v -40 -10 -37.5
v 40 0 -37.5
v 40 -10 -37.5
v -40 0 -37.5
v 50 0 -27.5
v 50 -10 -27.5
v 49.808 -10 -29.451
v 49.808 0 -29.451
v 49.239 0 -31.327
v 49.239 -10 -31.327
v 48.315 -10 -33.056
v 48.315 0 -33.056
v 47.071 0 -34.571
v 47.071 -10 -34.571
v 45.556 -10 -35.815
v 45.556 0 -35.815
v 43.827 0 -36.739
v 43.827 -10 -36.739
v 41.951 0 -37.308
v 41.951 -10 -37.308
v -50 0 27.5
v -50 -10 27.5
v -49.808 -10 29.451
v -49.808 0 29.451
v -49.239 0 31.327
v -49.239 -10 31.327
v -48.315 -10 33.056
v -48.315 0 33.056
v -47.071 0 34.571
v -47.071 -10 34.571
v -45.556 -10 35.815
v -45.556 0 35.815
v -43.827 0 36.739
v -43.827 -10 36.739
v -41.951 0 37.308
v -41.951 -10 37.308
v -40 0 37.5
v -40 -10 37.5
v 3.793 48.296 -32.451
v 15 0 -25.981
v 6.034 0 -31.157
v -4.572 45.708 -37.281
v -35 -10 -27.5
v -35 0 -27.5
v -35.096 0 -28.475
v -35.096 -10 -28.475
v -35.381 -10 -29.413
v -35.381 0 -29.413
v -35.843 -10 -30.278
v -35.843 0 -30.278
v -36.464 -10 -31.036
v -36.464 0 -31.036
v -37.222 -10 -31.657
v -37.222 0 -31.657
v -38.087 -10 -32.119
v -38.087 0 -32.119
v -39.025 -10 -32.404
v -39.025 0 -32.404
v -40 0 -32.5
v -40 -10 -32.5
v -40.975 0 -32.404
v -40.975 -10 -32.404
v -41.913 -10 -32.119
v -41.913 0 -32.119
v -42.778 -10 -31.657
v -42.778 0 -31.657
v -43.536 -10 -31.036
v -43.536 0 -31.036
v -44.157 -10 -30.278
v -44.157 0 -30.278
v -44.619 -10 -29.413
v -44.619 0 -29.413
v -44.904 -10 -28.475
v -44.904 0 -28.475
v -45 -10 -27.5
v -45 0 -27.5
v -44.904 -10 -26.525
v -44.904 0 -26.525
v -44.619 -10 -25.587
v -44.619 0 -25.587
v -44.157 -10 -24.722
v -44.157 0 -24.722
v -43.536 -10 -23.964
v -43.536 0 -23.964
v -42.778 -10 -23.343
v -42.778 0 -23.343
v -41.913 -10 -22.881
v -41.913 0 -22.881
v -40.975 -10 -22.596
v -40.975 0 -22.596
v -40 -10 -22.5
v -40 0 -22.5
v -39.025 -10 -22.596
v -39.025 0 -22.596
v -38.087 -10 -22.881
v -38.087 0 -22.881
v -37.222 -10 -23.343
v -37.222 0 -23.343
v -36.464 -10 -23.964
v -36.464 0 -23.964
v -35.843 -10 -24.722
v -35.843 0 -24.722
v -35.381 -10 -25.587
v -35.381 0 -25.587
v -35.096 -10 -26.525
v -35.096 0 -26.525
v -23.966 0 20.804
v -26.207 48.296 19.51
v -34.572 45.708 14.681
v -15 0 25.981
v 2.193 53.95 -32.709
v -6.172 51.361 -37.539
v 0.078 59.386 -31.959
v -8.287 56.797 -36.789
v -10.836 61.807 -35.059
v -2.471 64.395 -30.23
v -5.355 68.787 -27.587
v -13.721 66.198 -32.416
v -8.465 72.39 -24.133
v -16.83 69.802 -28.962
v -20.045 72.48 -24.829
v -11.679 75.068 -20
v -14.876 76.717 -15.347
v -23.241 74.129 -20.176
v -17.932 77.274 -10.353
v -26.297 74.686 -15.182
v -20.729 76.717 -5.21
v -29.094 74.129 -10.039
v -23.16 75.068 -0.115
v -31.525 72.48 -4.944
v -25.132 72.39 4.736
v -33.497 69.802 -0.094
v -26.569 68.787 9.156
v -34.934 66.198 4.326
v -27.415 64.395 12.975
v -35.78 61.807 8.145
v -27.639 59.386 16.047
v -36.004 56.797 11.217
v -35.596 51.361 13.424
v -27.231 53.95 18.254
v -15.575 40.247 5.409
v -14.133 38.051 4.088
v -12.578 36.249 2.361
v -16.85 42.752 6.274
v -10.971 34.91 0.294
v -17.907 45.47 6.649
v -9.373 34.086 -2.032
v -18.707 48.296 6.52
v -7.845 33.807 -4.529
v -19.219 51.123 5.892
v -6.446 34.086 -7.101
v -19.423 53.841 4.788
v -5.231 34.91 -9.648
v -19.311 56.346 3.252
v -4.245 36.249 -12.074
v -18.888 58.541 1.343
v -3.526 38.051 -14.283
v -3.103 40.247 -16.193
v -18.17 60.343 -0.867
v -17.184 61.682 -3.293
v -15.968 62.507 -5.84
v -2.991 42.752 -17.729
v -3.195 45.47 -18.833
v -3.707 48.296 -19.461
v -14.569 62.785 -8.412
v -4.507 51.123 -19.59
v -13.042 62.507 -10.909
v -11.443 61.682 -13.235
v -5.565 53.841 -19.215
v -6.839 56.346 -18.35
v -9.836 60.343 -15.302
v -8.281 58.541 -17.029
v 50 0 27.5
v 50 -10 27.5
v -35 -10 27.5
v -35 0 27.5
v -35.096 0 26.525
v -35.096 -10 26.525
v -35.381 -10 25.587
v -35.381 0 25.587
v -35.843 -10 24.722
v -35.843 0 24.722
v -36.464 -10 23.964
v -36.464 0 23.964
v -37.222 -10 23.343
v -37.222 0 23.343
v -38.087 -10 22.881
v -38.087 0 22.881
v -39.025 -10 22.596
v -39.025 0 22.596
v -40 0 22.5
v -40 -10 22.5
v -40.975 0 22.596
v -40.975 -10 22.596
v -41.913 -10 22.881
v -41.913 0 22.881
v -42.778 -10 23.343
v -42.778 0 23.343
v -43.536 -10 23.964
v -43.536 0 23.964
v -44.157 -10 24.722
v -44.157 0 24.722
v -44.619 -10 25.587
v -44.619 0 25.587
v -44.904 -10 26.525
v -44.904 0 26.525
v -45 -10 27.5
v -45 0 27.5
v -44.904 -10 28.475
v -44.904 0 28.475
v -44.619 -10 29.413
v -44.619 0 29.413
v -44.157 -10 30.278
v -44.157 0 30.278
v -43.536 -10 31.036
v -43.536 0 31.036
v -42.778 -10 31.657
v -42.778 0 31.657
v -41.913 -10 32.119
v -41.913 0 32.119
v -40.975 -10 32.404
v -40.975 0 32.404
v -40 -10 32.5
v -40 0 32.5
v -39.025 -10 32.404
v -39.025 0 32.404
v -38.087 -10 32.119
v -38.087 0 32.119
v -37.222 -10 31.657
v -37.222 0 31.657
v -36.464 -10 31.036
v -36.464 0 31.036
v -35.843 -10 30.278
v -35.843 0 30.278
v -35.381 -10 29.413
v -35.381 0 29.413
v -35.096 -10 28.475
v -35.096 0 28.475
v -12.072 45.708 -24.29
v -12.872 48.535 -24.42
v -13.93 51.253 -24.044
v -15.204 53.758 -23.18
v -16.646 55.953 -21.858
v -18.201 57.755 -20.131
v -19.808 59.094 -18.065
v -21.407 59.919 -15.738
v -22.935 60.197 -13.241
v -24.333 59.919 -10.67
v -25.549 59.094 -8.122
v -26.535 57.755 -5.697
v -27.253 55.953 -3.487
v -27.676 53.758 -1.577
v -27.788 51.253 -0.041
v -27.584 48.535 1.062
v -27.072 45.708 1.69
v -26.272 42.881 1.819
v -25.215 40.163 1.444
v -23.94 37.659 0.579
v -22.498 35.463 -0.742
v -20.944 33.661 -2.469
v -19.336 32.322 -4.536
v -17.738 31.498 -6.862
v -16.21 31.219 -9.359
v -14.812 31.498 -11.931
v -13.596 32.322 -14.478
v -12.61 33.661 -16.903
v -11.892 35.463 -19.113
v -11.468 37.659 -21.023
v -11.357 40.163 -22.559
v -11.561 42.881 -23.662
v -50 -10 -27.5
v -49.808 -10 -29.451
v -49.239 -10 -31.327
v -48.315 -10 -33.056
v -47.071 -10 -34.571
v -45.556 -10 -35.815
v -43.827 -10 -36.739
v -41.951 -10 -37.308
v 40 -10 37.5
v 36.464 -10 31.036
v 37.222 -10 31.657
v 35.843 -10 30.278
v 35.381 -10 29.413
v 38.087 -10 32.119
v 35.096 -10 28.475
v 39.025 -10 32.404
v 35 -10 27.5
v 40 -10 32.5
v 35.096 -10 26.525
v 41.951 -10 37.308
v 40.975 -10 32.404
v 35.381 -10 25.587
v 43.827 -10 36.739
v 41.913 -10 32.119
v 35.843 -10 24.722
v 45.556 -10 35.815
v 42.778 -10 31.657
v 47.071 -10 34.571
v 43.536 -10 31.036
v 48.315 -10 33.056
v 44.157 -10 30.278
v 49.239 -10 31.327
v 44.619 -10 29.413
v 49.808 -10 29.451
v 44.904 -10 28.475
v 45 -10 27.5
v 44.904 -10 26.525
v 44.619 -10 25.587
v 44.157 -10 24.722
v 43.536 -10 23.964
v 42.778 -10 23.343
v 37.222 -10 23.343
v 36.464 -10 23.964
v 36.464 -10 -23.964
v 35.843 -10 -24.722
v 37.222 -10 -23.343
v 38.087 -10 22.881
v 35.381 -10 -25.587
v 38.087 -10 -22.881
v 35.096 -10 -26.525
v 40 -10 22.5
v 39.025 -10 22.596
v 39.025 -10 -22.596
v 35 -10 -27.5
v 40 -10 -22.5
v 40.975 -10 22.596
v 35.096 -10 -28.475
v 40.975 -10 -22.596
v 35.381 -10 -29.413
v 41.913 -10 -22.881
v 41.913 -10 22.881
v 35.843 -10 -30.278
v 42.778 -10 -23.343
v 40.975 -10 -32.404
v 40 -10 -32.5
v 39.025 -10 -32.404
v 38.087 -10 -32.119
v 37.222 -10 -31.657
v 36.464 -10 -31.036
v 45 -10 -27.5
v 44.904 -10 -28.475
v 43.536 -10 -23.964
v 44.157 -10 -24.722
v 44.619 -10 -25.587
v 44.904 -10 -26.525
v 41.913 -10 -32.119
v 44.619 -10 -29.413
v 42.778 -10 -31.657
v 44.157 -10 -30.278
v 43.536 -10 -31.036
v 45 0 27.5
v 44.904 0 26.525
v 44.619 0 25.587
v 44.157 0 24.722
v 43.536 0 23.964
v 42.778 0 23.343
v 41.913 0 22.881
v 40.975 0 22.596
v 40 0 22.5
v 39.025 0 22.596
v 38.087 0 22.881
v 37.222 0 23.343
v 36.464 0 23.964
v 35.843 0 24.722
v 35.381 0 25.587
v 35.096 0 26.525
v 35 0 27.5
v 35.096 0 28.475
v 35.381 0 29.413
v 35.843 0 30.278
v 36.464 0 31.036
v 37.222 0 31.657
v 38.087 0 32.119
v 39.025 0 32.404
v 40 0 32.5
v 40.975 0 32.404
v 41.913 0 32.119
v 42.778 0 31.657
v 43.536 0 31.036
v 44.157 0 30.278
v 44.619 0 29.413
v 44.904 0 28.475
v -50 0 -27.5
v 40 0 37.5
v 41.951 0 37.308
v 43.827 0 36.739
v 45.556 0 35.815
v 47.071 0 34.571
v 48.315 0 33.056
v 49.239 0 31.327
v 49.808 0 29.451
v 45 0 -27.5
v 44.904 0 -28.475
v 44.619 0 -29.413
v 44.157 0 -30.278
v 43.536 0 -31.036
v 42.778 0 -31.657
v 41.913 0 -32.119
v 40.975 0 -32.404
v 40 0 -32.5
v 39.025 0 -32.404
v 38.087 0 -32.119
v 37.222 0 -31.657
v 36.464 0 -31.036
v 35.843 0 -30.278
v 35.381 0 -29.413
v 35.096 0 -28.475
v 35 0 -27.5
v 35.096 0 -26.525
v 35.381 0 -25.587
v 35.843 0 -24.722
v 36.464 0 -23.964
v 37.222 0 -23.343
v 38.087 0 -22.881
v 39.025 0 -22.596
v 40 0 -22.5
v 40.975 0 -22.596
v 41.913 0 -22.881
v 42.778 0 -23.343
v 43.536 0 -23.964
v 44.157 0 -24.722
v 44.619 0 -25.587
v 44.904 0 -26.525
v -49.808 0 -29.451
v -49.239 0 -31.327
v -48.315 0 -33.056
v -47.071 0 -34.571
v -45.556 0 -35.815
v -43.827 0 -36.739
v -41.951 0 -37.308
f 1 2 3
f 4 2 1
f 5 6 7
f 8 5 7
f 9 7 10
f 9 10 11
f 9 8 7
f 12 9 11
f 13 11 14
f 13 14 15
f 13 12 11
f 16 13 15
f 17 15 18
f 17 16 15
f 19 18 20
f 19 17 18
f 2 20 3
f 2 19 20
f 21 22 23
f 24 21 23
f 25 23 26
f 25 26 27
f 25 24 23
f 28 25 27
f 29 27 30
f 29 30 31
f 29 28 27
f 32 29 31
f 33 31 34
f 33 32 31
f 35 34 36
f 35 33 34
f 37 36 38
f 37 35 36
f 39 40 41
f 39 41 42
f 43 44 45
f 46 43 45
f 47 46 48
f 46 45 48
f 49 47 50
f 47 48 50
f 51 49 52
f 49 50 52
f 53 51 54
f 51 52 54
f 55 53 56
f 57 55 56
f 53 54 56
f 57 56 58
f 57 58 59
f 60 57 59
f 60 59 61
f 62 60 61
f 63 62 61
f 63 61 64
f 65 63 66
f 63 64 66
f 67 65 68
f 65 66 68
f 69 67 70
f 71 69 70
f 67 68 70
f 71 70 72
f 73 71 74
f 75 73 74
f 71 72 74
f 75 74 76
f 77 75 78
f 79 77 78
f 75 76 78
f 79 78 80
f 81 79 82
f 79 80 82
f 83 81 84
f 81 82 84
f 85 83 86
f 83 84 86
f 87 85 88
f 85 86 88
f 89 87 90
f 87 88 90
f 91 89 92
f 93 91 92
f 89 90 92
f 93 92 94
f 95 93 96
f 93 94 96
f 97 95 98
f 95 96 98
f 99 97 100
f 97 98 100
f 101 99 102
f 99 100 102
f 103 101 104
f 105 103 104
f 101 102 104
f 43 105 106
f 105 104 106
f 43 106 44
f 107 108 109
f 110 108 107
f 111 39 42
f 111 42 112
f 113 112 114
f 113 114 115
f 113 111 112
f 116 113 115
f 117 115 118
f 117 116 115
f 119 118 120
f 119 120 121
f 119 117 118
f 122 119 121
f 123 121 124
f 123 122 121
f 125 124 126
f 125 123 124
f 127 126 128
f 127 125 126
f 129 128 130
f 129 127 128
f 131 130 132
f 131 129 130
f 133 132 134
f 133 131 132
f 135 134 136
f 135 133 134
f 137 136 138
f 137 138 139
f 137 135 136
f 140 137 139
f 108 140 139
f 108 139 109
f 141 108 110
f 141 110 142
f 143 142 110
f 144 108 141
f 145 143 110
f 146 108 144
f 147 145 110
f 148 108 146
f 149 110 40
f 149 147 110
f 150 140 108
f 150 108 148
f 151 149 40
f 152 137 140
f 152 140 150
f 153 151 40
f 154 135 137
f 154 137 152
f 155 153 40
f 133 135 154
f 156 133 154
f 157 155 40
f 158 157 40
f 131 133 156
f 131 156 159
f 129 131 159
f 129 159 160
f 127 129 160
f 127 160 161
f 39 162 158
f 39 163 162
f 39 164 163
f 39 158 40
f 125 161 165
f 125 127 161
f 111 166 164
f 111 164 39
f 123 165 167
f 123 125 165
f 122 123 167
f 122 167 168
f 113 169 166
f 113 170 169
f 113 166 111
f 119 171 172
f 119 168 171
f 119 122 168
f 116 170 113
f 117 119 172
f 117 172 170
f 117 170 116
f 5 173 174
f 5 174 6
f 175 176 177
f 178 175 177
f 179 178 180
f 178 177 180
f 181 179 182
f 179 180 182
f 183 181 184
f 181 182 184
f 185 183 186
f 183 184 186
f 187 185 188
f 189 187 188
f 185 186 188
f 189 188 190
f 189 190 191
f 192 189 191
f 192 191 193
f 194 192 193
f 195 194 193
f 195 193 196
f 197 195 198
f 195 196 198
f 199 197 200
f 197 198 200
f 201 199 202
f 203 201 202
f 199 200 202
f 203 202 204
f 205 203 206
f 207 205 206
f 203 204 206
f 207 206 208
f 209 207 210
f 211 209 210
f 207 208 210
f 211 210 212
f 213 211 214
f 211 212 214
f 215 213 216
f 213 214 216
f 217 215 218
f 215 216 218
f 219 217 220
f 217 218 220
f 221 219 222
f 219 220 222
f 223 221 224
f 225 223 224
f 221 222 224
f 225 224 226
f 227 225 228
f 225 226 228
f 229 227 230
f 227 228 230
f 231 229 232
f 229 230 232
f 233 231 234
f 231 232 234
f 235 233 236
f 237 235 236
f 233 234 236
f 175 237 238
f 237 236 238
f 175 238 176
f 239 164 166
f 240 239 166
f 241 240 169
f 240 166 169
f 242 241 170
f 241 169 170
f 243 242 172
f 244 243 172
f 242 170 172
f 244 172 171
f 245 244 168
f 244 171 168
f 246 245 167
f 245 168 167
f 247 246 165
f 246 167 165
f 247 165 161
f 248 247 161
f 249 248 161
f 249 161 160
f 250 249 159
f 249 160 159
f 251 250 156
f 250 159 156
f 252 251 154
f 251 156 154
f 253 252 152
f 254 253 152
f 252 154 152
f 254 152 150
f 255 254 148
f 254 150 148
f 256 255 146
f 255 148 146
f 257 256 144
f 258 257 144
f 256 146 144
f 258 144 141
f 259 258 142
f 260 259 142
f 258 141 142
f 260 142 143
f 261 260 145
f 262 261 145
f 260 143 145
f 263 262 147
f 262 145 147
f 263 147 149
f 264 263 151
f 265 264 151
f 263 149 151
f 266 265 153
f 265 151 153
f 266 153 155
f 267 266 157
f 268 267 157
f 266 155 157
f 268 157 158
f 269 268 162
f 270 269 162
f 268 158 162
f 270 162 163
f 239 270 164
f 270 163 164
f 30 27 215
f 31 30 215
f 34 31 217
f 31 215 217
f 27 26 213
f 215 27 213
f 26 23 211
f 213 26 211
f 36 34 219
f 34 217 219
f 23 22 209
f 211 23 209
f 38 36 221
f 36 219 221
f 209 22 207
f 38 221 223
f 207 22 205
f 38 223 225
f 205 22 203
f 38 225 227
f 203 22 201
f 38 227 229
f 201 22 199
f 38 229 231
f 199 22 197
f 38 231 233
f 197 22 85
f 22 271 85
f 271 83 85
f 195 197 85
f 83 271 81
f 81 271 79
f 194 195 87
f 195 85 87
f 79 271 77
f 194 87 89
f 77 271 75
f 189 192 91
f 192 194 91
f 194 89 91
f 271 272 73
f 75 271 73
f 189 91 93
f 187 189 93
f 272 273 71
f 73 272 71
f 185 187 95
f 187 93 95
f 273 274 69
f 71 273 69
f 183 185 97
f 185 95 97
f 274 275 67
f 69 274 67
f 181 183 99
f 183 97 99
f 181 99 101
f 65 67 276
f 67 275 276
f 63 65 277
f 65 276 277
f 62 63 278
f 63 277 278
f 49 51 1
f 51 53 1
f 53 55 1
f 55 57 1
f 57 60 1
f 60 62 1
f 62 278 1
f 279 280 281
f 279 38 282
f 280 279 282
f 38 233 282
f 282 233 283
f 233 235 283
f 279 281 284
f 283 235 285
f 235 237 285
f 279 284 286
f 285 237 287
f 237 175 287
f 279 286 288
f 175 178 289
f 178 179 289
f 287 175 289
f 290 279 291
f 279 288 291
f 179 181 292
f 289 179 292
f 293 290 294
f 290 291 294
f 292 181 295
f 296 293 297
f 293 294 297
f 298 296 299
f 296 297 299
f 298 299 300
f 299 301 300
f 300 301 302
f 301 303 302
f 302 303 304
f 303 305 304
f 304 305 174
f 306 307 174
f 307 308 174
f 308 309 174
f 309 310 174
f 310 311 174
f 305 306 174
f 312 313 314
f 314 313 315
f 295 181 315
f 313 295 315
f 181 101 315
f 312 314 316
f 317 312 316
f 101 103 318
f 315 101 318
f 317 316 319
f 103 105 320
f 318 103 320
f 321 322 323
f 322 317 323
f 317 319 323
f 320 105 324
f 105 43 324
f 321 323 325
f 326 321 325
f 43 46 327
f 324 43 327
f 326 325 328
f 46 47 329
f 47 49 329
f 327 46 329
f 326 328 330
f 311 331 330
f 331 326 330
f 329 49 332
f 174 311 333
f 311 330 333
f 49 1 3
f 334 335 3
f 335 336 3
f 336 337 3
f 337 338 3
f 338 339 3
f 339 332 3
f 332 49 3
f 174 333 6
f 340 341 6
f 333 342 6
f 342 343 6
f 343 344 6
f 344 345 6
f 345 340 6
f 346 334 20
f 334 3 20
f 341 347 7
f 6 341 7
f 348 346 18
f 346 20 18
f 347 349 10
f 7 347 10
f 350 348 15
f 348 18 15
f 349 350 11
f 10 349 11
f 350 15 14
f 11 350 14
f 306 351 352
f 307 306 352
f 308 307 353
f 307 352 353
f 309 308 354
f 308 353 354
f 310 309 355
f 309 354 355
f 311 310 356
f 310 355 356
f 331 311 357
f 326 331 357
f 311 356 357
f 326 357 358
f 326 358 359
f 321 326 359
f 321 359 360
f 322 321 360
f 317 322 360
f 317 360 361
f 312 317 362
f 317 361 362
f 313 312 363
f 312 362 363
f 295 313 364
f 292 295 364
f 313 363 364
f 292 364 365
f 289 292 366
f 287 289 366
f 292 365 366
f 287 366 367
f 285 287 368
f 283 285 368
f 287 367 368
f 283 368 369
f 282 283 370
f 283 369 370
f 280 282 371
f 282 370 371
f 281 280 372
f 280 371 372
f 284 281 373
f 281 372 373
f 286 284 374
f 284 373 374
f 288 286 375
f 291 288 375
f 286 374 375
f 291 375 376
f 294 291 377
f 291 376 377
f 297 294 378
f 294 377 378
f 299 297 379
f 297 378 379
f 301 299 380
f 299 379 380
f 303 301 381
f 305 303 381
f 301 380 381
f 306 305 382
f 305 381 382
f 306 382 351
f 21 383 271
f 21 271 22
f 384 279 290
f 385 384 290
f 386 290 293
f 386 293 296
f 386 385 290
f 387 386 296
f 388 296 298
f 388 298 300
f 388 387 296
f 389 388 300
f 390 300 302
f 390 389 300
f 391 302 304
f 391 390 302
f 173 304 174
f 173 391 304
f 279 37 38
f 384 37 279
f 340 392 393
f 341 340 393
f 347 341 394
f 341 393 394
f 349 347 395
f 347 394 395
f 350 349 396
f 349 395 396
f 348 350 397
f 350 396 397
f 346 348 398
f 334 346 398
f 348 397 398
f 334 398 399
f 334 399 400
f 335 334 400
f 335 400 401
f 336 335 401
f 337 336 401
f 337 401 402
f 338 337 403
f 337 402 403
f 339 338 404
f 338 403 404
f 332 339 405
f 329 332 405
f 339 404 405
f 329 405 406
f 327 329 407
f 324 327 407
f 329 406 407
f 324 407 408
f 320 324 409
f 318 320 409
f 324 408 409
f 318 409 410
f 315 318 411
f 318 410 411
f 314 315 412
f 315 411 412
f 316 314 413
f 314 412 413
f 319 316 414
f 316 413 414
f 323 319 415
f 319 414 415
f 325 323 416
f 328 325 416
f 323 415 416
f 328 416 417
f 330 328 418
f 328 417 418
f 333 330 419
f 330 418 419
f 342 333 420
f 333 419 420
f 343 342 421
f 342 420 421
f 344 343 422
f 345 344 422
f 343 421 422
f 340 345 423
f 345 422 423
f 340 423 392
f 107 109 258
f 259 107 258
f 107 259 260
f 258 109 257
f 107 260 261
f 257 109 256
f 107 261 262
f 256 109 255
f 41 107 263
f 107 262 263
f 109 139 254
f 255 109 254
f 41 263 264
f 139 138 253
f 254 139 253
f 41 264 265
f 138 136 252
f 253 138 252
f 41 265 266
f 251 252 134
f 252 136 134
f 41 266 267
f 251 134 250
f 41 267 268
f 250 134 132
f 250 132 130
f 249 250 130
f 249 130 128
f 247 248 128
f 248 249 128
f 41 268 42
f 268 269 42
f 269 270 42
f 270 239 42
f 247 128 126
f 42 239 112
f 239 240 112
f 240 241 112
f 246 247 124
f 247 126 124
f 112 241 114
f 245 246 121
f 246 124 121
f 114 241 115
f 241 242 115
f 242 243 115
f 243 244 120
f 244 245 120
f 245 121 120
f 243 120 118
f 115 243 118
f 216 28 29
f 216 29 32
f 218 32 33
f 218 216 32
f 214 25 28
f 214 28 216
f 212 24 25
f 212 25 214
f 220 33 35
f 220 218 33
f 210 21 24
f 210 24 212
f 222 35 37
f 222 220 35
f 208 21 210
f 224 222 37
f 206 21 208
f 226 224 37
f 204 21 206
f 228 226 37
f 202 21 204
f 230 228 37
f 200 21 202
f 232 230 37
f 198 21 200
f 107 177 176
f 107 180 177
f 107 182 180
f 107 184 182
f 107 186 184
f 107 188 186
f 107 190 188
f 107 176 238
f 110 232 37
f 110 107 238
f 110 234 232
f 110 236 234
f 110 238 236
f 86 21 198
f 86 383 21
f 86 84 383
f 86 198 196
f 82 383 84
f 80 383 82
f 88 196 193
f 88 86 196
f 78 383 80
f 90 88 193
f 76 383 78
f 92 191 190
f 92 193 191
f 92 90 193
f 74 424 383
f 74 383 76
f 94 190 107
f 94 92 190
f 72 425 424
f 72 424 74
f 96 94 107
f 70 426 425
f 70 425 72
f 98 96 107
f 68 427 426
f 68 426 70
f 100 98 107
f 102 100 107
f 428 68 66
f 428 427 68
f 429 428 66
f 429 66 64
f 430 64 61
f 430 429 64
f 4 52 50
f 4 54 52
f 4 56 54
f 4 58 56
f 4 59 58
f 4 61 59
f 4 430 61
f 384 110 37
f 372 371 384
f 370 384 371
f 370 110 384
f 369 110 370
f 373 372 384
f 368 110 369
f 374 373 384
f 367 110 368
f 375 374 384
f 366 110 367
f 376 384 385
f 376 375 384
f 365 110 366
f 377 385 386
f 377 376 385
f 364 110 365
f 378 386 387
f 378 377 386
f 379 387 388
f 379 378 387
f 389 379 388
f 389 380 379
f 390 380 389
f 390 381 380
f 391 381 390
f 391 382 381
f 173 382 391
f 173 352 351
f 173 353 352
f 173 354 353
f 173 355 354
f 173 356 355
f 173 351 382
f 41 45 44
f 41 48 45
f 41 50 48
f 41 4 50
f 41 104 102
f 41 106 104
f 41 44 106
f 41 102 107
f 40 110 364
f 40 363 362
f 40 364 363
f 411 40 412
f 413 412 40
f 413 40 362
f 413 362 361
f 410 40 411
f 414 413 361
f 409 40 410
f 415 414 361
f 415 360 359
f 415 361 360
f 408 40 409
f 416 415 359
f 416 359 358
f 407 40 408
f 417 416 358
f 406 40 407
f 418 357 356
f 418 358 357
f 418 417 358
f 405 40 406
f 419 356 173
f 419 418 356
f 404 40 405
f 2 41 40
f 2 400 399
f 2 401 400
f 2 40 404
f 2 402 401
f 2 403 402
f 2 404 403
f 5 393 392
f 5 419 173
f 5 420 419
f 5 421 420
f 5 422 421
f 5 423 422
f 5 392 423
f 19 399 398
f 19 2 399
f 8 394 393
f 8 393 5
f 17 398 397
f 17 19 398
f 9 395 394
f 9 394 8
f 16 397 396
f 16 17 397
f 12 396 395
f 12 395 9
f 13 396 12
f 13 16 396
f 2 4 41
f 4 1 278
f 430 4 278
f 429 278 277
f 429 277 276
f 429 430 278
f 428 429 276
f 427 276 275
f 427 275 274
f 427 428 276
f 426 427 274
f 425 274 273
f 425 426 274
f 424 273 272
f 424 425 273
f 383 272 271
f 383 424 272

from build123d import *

# Parameters (mm, degrees)
SKETCH_1_R      = 5
EXTRUDE_1_DEPTH = 10
SKETCH_3_R      = 15
EXTRUDE_2_DEPTH = 10


with BuildPart() as part:
    # 草圖1 → 填料-伸長1 (new body)
    with BuildSketch(Plane(origin=(0, 0, 0), x_dir=(1, 0, 0), z_dir=(0, 1, 0))):
        with BuildLine():
            Line((-40, -37.5), (40, -37.5))
            ThreePointArc((40, -37.5), (47.071067812, -34.571067812), (50, -27.5))
            Line((50, -27.5), (50, 27.5))
            ThreePointArc((50, 27.5), (47.071067812, 34.571067812), (40, 37.5))
            Line((40, 37.5), (-40, 37.5))
            ThreePointArc((-40, 37.5), (-47.071067812, 34.571067812), (-50, 27.5))
            Line((-50, 27.5), (-50, -27.5))
            ThreePointArc((-50, -27.5), (-47.071067812, -34.571067812), (-40, -37.5))
        make_face()
        with Locations((-40, 27.5)):
            Circle(SKETCH_1_R, mode=Mode.SUBTRACT)
        with Locations((40, 27.5)):
            Circle(SKETCH_1_R, mode=Mode.SUBTRACT)
        with Locations((-40, -27.5)):
            Circle(SKETCH_1_R, mode=Mode.SUBTRACT)
        with Locations((40, -27.5)):
            Circle(SKETCH_1_R, mode=Mode.SUBTRACT)
    extrude(amount=-EXTRUDE_1_DEPTH)

    # 草圖3 → 填料-伸長2 (add)
    with BuildSketch(Plane(origin=(0, 0, 0), x_dir=(0.500000000000001, 0, -0.866025403784438), z_dir=(0.8365163037378073, 0.25881904510252135, 0.48296291314453504))):
        with BuildLine():
            Line((-30, 50), (-30, 0))
            Line((-30, 0), (30, 0))
            Line((30, 0), (30, 50))
            ThreePointArc((30, 50), (0, 80), (-30, 50))
        make_face()
        with Locations((0, 50)):
            Circle(SKETCH_3_R, mode=Mode.SUBTRACT)
    extrude(amount=-EXTRUDE_2_DEPTH)


solid = part.part
